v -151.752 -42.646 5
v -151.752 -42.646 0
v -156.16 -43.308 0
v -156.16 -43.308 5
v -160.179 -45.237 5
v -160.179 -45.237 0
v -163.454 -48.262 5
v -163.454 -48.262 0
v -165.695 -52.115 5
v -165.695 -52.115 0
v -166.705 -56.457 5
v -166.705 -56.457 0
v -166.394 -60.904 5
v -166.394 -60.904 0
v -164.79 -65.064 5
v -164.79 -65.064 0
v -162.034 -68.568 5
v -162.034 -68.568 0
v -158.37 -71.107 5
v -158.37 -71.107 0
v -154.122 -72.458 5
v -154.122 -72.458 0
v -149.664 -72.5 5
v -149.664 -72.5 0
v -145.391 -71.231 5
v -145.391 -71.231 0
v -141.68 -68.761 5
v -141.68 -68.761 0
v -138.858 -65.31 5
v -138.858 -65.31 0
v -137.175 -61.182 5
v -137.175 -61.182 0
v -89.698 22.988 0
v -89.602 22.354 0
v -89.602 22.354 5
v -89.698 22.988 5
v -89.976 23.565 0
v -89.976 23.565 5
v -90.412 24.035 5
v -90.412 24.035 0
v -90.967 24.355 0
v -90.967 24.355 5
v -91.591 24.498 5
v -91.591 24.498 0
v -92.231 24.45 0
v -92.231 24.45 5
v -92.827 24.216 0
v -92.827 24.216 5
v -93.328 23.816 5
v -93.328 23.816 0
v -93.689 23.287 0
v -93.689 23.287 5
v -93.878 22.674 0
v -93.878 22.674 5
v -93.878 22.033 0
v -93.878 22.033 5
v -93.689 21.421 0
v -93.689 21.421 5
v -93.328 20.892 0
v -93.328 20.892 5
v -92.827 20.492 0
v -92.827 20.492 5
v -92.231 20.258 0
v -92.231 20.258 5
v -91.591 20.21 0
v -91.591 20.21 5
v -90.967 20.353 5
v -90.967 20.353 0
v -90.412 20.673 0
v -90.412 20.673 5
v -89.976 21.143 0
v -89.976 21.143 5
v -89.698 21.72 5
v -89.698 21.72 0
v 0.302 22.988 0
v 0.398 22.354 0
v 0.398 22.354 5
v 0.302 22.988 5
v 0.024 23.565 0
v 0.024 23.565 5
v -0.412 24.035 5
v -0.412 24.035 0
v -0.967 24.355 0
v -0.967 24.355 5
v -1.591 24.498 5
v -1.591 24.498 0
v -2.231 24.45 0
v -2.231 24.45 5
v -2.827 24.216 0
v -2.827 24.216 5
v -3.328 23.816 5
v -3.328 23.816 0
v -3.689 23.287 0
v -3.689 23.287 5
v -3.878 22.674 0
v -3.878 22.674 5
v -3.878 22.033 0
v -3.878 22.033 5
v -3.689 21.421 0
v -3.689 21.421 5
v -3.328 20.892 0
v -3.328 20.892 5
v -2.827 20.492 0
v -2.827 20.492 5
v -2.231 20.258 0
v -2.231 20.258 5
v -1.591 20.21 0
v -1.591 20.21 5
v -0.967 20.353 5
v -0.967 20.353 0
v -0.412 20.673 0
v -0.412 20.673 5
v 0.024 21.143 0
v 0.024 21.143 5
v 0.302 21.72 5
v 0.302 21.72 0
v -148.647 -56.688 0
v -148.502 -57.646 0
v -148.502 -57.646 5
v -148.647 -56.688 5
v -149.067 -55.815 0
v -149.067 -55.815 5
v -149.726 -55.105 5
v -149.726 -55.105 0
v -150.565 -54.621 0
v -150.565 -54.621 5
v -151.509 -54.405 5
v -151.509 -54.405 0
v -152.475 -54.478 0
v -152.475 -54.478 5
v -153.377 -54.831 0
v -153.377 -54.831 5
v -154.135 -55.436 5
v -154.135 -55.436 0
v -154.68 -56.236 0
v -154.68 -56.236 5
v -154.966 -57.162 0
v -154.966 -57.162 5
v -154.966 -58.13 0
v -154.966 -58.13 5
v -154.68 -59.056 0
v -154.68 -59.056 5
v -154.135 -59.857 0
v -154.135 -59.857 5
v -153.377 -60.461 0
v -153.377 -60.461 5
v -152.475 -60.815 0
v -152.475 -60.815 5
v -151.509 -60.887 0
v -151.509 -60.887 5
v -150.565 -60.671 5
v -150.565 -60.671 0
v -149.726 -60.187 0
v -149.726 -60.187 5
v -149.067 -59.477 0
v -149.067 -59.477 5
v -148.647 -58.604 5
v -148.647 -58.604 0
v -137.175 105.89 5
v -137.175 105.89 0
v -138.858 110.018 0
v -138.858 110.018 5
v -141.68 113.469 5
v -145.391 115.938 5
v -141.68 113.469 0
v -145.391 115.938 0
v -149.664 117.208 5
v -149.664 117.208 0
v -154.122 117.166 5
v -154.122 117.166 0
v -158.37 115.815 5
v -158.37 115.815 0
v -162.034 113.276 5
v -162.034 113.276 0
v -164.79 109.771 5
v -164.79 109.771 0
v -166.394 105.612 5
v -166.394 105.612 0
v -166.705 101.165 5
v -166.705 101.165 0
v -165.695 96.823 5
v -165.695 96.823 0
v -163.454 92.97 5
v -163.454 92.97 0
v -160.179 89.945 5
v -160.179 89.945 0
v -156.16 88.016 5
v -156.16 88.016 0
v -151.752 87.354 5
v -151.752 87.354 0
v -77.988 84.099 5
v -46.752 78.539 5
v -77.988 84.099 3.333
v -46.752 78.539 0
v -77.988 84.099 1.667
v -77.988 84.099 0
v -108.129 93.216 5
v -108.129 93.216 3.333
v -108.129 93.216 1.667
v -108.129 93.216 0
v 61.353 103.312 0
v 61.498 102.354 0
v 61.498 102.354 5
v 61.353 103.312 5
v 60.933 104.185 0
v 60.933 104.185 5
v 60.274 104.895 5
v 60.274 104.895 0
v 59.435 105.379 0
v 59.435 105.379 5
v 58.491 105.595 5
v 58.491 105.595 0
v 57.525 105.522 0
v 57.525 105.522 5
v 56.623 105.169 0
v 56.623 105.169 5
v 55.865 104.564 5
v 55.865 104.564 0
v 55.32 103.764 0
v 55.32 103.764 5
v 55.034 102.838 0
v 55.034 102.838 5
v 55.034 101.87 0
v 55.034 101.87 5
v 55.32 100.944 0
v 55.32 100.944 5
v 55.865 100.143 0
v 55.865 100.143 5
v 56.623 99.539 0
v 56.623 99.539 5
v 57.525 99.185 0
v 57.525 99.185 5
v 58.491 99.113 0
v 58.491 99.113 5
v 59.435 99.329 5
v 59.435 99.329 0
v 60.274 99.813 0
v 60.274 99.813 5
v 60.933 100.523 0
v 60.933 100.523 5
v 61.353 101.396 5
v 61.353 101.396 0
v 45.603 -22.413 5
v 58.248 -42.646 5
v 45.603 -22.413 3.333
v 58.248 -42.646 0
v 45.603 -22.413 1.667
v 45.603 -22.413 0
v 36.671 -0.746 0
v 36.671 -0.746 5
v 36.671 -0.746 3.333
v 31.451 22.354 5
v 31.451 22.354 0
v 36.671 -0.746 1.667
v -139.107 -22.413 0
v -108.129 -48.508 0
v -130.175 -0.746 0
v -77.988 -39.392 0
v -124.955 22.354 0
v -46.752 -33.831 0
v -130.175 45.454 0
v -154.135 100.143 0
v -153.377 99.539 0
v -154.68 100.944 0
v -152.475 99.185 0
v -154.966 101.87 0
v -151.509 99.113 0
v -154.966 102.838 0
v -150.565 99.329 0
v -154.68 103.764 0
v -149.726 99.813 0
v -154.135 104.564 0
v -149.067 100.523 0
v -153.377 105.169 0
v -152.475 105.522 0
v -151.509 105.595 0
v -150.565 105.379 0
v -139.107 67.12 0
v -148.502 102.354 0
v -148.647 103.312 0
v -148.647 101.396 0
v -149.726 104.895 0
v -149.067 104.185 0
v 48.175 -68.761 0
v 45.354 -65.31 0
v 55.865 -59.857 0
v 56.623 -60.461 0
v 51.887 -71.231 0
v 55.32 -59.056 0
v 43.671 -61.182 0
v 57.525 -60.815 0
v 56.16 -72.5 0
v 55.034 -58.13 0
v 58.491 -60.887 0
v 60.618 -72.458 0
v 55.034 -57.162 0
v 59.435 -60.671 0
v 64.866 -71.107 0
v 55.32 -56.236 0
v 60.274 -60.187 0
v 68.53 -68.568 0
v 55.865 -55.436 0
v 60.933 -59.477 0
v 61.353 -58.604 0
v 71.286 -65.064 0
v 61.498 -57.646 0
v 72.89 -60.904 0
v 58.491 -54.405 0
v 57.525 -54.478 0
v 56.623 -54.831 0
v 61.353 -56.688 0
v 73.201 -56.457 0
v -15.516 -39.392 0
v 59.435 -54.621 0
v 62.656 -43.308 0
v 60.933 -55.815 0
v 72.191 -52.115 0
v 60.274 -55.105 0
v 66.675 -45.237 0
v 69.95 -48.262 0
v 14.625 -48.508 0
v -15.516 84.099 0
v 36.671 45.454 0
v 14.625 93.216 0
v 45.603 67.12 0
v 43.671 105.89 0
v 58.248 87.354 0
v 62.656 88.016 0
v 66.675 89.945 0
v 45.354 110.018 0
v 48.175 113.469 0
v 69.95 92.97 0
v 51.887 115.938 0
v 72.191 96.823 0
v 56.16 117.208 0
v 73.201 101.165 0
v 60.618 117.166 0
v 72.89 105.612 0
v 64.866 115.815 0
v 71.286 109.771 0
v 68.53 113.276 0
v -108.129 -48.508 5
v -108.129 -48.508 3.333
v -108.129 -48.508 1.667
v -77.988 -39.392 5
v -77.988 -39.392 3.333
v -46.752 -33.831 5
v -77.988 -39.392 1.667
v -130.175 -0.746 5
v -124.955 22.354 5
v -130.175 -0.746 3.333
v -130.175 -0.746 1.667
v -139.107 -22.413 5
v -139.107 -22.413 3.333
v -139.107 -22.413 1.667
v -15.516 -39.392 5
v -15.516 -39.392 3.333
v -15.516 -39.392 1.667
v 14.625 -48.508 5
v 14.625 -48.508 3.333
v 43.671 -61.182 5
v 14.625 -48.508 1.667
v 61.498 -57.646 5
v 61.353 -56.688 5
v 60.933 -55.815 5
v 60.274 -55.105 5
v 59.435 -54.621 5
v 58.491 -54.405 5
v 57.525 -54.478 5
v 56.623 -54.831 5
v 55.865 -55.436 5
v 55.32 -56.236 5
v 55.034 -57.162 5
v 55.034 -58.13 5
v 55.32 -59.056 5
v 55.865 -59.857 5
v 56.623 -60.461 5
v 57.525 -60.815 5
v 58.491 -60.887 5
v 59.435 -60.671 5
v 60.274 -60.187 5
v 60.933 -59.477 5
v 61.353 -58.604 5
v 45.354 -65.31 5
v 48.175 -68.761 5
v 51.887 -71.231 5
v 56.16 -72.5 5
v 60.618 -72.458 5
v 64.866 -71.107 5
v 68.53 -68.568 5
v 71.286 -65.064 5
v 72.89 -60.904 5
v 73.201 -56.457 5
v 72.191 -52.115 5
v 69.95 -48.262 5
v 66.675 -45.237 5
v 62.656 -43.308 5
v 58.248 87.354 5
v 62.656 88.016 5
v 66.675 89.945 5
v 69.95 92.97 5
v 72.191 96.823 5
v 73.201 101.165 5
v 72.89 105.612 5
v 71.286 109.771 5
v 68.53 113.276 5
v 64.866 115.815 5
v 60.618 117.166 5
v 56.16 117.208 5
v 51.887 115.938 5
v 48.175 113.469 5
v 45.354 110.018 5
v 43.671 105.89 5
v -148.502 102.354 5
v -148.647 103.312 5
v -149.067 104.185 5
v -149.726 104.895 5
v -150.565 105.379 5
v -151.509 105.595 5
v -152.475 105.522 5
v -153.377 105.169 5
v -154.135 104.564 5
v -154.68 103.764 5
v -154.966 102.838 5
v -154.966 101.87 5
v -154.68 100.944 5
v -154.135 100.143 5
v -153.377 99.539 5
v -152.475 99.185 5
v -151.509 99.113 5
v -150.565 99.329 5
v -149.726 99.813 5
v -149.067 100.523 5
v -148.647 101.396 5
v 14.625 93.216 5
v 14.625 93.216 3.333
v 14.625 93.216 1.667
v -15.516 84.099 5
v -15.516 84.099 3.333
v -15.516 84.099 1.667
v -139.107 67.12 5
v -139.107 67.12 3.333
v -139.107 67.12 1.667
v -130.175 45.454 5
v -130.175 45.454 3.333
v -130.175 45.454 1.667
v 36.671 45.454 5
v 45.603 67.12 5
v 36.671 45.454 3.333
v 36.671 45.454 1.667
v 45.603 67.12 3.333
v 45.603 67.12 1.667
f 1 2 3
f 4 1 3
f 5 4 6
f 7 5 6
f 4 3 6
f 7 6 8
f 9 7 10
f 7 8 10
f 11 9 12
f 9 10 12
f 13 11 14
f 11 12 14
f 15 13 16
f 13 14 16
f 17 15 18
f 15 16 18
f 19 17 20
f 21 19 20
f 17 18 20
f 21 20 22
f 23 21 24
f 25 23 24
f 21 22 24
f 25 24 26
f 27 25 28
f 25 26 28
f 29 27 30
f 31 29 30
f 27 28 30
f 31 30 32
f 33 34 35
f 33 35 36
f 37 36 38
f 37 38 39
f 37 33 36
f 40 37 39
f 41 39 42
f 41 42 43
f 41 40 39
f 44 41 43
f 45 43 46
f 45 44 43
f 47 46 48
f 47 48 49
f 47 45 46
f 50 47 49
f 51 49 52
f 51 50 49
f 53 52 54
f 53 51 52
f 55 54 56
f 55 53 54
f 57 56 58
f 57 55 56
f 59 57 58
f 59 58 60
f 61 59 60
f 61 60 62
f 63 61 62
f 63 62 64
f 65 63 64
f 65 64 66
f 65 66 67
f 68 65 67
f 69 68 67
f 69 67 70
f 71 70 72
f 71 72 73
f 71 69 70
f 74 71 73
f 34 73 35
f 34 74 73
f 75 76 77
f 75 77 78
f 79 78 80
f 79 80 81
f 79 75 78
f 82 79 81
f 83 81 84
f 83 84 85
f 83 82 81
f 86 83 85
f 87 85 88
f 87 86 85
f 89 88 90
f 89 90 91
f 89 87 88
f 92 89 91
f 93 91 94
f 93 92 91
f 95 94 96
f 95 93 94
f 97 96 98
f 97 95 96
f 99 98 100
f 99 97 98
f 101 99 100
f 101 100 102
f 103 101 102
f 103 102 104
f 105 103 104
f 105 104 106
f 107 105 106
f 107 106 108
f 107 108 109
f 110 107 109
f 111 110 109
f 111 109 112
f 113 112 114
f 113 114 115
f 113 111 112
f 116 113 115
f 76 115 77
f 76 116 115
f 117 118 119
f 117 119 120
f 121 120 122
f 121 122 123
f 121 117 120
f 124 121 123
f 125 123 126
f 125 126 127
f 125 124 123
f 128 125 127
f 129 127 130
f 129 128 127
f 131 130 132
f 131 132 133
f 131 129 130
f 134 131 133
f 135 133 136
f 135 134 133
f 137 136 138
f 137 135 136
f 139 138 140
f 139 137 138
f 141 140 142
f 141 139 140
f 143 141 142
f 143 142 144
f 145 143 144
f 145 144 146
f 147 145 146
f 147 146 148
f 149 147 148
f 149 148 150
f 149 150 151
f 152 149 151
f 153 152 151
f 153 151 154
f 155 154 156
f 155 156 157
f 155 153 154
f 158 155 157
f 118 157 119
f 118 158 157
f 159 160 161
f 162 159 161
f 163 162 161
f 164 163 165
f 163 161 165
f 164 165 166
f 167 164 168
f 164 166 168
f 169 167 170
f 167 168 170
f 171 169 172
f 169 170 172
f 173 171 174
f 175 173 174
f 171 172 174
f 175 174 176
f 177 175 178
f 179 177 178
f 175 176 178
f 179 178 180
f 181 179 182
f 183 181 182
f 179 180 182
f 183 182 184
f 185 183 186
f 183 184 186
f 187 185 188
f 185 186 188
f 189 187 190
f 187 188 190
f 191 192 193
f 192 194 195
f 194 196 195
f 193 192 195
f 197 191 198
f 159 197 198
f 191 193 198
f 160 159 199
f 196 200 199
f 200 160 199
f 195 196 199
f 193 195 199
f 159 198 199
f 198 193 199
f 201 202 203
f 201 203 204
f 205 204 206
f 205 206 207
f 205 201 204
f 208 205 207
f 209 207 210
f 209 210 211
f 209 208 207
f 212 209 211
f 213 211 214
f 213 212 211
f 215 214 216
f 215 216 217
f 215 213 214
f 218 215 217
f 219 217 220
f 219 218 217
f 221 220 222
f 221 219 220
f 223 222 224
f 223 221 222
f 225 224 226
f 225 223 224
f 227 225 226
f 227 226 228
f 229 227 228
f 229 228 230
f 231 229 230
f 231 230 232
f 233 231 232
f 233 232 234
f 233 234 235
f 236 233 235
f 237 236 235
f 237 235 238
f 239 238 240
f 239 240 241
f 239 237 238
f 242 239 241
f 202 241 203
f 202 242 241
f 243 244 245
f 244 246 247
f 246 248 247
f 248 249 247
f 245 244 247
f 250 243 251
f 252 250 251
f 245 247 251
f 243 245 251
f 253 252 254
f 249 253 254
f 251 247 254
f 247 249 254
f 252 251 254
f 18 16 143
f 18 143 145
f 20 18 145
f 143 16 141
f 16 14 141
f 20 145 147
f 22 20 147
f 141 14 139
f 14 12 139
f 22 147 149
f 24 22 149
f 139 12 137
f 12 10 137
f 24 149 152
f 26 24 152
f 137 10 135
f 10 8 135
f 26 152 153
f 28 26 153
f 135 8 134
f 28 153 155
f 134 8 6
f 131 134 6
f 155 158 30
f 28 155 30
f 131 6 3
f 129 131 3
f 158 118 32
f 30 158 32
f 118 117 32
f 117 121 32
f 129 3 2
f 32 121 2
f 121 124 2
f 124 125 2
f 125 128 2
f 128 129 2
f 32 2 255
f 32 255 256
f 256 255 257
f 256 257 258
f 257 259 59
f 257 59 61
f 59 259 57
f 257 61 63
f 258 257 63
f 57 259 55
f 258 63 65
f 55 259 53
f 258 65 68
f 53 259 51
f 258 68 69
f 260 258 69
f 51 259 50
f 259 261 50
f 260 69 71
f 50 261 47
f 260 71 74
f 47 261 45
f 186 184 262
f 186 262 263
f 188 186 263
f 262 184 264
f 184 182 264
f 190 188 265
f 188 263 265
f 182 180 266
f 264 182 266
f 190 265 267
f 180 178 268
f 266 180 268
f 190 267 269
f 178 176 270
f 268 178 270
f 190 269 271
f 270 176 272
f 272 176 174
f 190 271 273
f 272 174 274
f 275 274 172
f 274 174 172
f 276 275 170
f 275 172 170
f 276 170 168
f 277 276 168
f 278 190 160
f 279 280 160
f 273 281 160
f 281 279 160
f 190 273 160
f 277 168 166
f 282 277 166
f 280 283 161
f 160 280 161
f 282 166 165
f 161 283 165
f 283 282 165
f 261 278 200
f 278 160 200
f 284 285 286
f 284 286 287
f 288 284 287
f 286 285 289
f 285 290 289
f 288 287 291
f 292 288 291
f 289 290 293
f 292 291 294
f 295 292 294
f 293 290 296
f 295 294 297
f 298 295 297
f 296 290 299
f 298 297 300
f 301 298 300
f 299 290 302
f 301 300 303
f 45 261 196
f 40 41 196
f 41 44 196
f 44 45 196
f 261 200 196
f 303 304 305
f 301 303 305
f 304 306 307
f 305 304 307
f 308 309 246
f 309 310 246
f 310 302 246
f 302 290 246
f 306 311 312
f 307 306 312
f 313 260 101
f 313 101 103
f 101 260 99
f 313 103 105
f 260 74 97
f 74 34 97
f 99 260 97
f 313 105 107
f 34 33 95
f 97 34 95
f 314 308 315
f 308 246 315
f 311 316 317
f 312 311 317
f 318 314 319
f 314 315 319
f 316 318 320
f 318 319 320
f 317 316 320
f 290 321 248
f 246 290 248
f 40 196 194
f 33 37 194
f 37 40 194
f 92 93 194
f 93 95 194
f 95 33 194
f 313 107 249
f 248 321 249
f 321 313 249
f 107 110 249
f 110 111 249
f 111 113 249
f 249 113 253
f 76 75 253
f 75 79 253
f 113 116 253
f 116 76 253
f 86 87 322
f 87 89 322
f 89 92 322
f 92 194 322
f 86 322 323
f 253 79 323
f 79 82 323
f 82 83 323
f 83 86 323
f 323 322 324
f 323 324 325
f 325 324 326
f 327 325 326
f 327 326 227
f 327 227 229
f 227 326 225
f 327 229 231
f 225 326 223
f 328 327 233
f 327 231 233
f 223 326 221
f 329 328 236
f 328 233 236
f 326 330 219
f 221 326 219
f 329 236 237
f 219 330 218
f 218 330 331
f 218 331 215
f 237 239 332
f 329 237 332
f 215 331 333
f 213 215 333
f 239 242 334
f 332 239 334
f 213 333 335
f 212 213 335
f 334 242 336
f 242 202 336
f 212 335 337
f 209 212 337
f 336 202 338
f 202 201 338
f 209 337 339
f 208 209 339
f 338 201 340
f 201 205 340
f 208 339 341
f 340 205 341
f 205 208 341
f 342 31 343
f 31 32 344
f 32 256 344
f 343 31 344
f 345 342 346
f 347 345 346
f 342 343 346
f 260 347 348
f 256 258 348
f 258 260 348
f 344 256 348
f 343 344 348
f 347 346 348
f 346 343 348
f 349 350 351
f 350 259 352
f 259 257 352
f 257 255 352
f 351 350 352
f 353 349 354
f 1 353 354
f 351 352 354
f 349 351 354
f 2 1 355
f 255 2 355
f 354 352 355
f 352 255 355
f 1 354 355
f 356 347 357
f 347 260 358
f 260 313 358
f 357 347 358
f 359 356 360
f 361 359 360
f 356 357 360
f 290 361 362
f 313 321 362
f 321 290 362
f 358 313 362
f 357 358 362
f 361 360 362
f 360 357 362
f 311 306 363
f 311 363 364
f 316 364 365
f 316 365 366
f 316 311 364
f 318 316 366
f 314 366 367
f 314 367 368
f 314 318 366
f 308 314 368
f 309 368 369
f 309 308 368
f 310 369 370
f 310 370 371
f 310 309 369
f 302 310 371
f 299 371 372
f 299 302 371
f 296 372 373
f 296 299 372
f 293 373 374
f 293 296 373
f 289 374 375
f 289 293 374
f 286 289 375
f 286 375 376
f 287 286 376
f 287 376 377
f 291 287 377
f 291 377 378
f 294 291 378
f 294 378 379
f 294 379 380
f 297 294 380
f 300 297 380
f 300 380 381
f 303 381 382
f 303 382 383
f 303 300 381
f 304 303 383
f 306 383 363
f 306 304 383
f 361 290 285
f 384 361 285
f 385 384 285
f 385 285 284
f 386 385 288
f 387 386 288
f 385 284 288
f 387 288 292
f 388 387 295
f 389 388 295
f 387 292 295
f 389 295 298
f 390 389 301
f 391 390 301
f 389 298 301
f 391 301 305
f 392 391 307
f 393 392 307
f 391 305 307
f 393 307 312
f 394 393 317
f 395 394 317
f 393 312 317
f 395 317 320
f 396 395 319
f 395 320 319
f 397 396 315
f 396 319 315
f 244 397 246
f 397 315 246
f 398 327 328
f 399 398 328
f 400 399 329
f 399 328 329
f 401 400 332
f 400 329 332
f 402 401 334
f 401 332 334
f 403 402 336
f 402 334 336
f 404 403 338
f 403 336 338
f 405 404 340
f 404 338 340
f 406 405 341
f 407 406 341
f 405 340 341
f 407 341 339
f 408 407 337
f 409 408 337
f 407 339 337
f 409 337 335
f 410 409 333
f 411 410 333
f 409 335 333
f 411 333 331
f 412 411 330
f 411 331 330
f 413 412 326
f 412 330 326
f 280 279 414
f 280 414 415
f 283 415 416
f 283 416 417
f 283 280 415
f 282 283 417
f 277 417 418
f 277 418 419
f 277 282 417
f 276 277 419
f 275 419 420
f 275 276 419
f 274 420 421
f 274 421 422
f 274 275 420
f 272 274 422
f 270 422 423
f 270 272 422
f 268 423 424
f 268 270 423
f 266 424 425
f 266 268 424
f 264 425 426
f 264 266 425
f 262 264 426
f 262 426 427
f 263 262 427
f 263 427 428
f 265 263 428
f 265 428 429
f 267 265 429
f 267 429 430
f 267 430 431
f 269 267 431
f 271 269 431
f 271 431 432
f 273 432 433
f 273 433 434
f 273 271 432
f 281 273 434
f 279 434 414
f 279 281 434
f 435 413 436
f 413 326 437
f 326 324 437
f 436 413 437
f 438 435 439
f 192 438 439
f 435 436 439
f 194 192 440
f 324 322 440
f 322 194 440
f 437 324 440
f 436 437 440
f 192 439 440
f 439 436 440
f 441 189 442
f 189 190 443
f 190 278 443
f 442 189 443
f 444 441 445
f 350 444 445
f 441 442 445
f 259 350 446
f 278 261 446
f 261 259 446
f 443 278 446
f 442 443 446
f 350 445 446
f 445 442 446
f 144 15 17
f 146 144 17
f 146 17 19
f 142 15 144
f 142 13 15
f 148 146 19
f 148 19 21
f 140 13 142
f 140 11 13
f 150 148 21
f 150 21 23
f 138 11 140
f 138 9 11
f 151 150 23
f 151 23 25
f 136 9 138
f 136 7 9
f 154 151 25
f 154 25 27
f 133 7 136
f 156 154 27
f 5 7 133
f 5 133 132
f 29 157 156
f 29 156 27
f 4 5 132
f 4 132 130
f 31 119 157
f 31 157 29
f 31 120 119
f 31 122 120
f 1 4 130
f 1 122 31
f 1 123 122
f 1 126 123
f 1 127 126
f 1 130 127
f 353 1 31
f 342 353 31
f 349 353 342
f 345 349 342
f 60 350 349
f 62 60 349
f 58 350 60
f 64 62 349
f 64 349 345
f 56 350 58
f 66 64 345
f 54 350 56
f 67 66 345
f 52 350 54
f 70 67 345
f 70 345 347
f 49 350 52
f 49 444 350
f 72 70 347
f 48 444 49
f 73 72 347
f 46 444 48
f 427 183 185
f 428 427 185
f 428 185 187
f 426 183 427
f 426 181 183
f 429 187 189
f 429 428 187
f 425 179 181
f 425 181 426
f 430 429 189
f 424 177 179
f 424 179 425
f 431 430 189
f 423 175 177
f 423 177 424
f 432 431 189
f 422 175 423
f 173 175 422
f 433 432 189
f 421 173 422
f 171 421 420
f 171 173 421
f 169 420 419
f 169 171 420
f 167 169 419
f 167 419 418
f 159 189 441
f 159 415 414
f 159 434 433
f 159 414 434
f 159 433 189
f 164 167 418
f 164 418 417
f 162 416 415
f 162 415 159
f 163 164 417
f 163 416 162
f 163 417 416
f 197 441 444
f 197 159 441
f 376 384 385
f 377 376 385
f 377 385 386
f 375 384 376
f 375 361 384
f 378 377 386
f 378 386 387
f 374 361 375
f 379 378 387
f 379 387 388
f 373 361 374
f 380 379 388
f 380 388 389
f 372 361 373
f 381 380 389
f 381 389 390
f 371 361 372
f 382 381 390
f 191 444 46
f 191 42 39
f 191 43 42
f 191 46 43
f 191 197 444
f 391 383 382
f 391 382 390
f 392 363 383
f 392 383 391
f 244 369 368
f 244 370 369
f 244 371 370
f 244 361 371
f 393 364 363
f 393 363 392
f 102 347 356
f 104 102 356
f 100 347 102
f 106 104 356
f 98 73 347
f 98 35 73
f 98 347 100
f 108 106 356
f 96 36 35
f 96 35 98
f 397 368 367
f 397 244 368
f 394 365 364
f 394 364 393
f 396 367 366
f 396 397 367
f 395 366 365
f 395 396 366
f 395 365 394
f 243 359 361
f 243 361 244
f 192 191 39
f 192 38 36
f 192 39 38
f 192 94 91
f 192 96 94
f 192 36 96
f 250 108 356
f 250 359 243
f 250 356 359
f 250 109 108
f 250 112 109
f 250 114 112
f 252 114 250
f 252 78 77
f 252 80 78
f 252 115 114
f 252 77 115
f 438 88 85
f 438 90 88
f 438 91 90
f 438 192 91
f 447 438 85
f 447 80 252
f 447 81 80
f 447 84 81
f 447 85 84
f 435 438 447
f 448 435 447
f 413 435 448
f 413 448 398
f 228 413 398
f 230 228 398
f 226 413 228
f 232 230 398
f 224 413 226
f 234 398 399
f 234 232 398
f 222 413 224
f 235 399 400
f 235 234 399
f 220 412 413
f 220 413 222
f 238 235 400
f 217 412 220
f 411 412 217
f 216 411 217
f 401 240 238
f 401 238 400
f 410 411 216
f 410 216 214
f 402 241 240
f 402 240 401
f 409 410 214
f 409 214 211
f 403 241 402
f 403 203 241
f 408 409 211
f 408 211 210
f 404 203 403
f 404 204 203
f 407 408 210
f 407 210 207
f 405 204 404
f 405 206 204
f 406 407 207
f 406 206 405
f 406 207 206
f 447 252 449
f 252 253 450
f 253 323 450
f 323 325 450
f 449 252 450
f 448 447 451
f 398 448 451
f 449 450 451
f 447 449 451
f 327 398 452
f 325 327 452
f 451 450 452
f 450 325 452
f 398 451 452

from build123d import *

# Parameters (mm, degrees)
SKETCH2_R           = 3.25
SKETCH2_R_2         = 2.15
BOSS_EXTRUDE1_DEPTH = 5


with BuildPart() as part:
    # Sketch2 → Boss-Extrude1 (new body)
    with BuildSketch(Plane.XY):
        with BuildLine():
            ThreePointArc((58.247868643, 87.353936938), (70.038600193, 111.62640422), (43.670645638, 105.890117005))
            add(Edge.make_bspline(
                [(43.670645638, 105.890117005), (15.172778081, 91.437929288), (-14.968147584, 82.320982869), (-46.752131357, 78.539277748)],
                knots=[0, 0, 0, 0, 1, 1, 1, 1], degree=3, weights=[1, 1, 1, 1]))
            add(Edge.make_bspline(
                [(-46.752131357, 78.539277748), (-78.53611513, 82.320982869), (-108.677040795, 91.437929288), (-137.174908352, 105.890117005)],
                knots=[0, 0, 0, 0, 1, 1, 1, 1], degree=3, weights=[1, 1, 1, 1]))
            ThreePointArc((-137.174908352, 105.890117005), (-163.542862908, 111.62640422), (-151.752131357, 87.353936938))
            add(Edge.make_bspline(
                [(-151.752131357, 87.353936938), (-137.251152171, 67.836975358), (-128.318856179, 46.170308692), (-124.955243383, 22.353936938)],
                knots=[0, 0, 0, 0, 1, 1, 1, 1], degree=3, weights=[1, 1, 1, 1]))
            add(Edge.make_bspline(
                [(-124.955243383, 22.353936938), (-128.318856179, -1.462434816), (-137.251152171, -23.129101482), (-151.752131357, -42.646063062)],
                knots=[0, 0, 0, 0, 1, 1, 1, 1], degree=3, weights=[1, 1, 1, 1]))
            ThreePointArc((-151.752131357, -42.646063062), (-163.542862908, -66.918530344), (-137.174908352, -61.182243129))
            add(Edge.make_bspline(
                [(-137.174908352, -61.182243129), (-108.677040795, -46.730055412), (-78.53611513, -37.613108993), (-46.752131357, -33.831403872)],
                knots=[0, 0, 0, 0, 1, 1, 1, 1], degree=3, weights=[1, 1, 1, 1]))
            add(Edge.make_bspline(
                [(-46.752131357, -33.831403872), (-14.968147584, -37.613108993), (15.172778081, -46.730055412), (43.670645638, -61.182243129)],
                knots=[0, 0, 0, 0, 1, 1, 1, 1], degree=3, weights=[1, 1, 1, 1]))
            ThreePointArc((43.670645638, -61.182243129), (70.038600194, -66.918530344), (58.247868643, -42.646063062))
            add(Edge.make_bspline(
                [(58.247868643, -42.646063062), (43.746889456, -23.129101482), (34.814593465, -1.462434816), (31.450980669, 22.353936938)],
                knots=[0, 0, 0, 0, 1, 1, 1, 1], degree=3, weights=[1, 1, 1, 1]))
            add(Edge.make_bspline(
                [(31.450980669, 22.353936938), (34.814593465, 46.170308692), (43.746889456, 67.836975358), (58.247868643, 87.353936938)],
                knots=[0, 0, 0, 0, 1, 1, 1, 1], degree=3, weights=[1, 1, 1, 1]))
        make_face()
        with Locations((-151.752131357, 102.353936938)):
            Circle(SKETCH2_R, mode=Mode.SUBTRACT)
        with Locations((58.247868643, -57.646063062)):
            Circle(SKETCH2_R, mode=Mode.SUBTRACT)
        with Locations((58.247868643, 102.353936938)):
            Circle(SKETCH2_R, mode=Mode.SUBTRACT)
        with Locations((-1.752131357, 22.353936938)):
            Circle(SKETCH2_R_2, mode=Mode.SUBTRACT)
        with Locations((-91.752131357, 22.353936938)):
            Circle(SKETCH2_R_2, mode=Mode.SUBTRACT)
        with Locations((-151.752131357, -57.646063062)):
            Circle(SKETCH2_R, mode=Mode.SUBTRACT)
    extrude(amount=BOSS_EXTRUDE1_DEPTH)


solid = part.part
